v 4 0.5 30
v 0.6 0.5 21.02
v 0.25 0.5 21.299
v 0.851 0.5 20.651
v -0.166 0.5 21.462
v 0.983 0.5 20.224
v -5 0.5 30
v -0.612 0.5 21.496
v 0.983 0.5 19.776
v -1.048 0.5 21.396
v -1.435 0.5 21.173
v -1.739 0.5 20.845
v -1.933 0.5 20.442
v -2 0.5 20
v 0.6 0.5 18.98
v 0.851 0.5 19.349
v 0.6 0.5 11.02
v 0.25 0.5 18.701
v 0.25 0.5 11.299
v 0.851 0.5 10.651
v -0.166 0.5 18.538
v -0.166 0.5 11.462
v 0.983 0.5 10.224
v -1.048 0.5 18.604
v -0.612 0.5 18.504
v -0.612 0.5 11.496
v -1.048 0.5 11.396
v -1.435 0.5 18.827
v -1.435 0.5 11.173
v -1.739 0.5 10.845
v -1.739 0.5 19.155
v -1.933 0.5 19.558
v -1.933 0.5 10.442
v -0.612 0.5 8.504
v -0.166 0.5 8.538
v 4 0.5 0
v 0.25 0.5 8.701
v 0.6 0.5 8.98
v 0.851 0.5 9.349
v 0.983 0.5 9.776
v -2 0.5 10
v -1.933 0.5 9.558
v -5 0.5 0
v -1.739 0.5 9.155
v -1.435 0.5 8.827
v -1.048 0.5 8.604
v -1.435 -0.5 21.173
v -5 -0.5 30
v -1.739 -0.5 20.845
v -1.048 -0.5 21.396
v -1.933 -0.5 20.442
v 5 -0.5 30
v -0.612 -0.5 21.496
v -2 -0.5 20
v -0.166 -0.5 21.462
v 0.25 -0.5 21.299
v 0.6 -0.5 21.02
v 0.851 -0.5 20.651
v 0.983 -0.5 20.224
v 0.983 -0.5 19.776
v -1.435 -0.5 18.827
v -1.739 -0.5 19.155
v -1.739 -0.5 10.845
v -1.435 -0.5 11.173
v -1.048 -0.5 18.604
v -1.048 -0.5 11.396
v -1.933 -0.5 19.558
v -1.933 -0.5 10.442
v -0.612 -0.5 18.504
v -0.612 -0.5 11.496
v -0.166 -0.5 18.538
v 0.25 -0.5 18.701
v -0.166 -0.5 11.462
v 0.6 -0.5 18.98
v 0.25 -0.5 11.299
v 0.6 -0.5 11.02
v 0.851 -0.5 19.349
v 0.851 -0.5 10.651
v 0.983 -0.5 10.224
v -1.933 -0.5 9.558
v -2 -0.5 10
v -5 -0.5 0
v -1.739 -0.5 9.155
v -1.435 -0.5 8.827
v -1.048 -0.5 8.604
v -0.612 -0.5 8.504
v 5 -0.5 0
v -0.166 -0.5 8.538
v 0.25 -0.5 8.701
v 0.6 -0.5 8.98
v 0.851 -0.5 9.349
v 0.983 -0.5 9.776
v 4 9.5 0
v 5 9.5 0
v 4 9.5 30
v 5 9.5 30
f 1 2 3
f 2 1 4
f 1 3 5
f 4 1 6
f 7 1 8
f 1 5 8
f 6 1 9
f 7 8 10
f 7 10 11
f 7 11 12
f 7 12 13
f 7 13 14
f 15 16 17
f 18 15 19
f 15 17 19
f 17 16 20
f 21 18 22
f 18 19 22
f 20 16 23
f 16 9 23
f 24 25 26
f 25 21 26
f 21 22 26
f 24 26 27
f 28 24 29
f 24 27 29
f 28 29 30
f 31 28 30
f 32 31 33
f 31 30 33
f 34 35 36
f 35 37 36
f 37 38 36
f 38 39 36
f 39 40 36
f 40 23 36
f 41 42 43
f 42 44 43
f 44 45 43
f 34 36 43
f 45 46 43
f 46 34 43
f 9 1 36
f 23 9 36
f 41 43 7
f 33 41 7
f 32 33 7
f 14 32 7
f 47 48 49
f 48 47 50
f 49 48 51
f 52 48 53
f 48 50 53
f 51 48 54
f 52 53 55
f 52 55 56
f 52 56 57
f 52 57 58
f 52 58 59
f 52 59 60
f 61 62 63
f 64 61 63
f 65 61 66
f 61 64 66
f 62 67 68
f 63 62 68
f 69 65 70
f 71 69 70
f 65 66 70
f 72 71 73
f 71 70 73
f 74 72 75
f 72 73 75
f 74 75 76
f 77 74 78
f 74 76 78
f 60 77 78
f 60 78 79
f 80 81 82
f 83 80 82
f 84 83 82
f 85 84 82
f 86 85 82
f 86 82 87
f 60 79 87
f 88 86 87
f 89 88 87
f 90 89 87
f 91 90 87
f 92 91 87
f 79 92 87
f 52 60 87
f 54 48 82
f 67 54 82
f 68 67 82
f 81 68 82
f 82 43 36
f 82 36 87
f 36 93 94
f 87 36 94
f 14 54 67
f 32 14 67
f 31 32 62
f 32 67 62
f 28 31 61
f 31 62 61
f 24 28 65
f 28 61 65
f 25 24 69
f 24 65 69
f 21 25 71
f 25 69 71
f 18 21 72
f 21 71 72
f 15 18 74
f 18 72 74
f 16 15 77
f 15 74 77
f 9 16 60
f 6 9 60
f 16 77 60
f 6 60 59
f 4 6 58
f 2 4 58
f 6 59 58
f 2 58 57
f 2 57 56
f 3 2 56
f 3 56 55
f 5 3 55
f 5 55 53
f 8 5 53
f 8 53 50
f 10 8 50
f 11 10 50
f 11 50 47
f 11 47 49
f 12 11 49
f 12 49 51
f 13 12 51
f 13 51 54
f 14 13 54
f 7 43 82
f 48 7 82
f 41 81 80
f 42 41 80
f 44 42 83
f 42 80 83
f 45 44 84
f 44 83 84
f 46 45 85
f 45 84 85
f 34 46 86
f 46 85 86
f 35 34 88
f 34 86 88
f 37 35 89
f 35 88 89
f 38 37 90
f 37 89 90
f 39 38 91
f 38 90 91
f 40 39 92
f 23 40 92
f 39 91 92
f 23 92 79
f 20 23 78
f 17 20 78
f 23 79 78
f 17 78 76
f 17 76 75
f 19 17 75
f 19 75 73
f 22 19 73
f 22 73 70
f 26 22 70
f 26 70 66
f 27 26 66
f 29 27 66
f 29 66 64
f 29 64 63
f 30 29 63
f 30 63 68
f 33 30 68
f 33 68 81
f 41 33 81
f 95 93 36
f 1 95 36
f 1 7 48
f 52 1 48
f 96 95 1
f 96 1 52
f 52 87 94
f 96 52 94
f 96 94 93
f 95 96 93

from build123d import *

# Parameters (mm, degrees)
EXTRUDE_1_DEPTH       = 30
HOLE_WIZARD_3_0_3_1_D = 3


with BuildPart() as part:
    # Эскиз1 → Бобышка-Вытянуть1 (new body)
    with BuildSketch(Plane.XY):
        Polygon((4, 0.5), (-5, 0.5), (-5, -0.5), (5, -0.5), (5, 0.5), (5, 9.5), (4, 9.5), align=None)
    extrude(amount=EXTRUDE_1_DEPTH)

    # Диаметр отверстия Ø3.0 (3)1 (through all)
    with Locations(Plane(origin=(0, 0.5, 0), x_dir=(1, 0, 0), z_dir=(0, 1, 0))):
        with Locations((-0.5, -10), (-0.5, -20)):
            Hole(HOLE_WIZARD_3_0_3_1_D / 2)


solid = part.part
